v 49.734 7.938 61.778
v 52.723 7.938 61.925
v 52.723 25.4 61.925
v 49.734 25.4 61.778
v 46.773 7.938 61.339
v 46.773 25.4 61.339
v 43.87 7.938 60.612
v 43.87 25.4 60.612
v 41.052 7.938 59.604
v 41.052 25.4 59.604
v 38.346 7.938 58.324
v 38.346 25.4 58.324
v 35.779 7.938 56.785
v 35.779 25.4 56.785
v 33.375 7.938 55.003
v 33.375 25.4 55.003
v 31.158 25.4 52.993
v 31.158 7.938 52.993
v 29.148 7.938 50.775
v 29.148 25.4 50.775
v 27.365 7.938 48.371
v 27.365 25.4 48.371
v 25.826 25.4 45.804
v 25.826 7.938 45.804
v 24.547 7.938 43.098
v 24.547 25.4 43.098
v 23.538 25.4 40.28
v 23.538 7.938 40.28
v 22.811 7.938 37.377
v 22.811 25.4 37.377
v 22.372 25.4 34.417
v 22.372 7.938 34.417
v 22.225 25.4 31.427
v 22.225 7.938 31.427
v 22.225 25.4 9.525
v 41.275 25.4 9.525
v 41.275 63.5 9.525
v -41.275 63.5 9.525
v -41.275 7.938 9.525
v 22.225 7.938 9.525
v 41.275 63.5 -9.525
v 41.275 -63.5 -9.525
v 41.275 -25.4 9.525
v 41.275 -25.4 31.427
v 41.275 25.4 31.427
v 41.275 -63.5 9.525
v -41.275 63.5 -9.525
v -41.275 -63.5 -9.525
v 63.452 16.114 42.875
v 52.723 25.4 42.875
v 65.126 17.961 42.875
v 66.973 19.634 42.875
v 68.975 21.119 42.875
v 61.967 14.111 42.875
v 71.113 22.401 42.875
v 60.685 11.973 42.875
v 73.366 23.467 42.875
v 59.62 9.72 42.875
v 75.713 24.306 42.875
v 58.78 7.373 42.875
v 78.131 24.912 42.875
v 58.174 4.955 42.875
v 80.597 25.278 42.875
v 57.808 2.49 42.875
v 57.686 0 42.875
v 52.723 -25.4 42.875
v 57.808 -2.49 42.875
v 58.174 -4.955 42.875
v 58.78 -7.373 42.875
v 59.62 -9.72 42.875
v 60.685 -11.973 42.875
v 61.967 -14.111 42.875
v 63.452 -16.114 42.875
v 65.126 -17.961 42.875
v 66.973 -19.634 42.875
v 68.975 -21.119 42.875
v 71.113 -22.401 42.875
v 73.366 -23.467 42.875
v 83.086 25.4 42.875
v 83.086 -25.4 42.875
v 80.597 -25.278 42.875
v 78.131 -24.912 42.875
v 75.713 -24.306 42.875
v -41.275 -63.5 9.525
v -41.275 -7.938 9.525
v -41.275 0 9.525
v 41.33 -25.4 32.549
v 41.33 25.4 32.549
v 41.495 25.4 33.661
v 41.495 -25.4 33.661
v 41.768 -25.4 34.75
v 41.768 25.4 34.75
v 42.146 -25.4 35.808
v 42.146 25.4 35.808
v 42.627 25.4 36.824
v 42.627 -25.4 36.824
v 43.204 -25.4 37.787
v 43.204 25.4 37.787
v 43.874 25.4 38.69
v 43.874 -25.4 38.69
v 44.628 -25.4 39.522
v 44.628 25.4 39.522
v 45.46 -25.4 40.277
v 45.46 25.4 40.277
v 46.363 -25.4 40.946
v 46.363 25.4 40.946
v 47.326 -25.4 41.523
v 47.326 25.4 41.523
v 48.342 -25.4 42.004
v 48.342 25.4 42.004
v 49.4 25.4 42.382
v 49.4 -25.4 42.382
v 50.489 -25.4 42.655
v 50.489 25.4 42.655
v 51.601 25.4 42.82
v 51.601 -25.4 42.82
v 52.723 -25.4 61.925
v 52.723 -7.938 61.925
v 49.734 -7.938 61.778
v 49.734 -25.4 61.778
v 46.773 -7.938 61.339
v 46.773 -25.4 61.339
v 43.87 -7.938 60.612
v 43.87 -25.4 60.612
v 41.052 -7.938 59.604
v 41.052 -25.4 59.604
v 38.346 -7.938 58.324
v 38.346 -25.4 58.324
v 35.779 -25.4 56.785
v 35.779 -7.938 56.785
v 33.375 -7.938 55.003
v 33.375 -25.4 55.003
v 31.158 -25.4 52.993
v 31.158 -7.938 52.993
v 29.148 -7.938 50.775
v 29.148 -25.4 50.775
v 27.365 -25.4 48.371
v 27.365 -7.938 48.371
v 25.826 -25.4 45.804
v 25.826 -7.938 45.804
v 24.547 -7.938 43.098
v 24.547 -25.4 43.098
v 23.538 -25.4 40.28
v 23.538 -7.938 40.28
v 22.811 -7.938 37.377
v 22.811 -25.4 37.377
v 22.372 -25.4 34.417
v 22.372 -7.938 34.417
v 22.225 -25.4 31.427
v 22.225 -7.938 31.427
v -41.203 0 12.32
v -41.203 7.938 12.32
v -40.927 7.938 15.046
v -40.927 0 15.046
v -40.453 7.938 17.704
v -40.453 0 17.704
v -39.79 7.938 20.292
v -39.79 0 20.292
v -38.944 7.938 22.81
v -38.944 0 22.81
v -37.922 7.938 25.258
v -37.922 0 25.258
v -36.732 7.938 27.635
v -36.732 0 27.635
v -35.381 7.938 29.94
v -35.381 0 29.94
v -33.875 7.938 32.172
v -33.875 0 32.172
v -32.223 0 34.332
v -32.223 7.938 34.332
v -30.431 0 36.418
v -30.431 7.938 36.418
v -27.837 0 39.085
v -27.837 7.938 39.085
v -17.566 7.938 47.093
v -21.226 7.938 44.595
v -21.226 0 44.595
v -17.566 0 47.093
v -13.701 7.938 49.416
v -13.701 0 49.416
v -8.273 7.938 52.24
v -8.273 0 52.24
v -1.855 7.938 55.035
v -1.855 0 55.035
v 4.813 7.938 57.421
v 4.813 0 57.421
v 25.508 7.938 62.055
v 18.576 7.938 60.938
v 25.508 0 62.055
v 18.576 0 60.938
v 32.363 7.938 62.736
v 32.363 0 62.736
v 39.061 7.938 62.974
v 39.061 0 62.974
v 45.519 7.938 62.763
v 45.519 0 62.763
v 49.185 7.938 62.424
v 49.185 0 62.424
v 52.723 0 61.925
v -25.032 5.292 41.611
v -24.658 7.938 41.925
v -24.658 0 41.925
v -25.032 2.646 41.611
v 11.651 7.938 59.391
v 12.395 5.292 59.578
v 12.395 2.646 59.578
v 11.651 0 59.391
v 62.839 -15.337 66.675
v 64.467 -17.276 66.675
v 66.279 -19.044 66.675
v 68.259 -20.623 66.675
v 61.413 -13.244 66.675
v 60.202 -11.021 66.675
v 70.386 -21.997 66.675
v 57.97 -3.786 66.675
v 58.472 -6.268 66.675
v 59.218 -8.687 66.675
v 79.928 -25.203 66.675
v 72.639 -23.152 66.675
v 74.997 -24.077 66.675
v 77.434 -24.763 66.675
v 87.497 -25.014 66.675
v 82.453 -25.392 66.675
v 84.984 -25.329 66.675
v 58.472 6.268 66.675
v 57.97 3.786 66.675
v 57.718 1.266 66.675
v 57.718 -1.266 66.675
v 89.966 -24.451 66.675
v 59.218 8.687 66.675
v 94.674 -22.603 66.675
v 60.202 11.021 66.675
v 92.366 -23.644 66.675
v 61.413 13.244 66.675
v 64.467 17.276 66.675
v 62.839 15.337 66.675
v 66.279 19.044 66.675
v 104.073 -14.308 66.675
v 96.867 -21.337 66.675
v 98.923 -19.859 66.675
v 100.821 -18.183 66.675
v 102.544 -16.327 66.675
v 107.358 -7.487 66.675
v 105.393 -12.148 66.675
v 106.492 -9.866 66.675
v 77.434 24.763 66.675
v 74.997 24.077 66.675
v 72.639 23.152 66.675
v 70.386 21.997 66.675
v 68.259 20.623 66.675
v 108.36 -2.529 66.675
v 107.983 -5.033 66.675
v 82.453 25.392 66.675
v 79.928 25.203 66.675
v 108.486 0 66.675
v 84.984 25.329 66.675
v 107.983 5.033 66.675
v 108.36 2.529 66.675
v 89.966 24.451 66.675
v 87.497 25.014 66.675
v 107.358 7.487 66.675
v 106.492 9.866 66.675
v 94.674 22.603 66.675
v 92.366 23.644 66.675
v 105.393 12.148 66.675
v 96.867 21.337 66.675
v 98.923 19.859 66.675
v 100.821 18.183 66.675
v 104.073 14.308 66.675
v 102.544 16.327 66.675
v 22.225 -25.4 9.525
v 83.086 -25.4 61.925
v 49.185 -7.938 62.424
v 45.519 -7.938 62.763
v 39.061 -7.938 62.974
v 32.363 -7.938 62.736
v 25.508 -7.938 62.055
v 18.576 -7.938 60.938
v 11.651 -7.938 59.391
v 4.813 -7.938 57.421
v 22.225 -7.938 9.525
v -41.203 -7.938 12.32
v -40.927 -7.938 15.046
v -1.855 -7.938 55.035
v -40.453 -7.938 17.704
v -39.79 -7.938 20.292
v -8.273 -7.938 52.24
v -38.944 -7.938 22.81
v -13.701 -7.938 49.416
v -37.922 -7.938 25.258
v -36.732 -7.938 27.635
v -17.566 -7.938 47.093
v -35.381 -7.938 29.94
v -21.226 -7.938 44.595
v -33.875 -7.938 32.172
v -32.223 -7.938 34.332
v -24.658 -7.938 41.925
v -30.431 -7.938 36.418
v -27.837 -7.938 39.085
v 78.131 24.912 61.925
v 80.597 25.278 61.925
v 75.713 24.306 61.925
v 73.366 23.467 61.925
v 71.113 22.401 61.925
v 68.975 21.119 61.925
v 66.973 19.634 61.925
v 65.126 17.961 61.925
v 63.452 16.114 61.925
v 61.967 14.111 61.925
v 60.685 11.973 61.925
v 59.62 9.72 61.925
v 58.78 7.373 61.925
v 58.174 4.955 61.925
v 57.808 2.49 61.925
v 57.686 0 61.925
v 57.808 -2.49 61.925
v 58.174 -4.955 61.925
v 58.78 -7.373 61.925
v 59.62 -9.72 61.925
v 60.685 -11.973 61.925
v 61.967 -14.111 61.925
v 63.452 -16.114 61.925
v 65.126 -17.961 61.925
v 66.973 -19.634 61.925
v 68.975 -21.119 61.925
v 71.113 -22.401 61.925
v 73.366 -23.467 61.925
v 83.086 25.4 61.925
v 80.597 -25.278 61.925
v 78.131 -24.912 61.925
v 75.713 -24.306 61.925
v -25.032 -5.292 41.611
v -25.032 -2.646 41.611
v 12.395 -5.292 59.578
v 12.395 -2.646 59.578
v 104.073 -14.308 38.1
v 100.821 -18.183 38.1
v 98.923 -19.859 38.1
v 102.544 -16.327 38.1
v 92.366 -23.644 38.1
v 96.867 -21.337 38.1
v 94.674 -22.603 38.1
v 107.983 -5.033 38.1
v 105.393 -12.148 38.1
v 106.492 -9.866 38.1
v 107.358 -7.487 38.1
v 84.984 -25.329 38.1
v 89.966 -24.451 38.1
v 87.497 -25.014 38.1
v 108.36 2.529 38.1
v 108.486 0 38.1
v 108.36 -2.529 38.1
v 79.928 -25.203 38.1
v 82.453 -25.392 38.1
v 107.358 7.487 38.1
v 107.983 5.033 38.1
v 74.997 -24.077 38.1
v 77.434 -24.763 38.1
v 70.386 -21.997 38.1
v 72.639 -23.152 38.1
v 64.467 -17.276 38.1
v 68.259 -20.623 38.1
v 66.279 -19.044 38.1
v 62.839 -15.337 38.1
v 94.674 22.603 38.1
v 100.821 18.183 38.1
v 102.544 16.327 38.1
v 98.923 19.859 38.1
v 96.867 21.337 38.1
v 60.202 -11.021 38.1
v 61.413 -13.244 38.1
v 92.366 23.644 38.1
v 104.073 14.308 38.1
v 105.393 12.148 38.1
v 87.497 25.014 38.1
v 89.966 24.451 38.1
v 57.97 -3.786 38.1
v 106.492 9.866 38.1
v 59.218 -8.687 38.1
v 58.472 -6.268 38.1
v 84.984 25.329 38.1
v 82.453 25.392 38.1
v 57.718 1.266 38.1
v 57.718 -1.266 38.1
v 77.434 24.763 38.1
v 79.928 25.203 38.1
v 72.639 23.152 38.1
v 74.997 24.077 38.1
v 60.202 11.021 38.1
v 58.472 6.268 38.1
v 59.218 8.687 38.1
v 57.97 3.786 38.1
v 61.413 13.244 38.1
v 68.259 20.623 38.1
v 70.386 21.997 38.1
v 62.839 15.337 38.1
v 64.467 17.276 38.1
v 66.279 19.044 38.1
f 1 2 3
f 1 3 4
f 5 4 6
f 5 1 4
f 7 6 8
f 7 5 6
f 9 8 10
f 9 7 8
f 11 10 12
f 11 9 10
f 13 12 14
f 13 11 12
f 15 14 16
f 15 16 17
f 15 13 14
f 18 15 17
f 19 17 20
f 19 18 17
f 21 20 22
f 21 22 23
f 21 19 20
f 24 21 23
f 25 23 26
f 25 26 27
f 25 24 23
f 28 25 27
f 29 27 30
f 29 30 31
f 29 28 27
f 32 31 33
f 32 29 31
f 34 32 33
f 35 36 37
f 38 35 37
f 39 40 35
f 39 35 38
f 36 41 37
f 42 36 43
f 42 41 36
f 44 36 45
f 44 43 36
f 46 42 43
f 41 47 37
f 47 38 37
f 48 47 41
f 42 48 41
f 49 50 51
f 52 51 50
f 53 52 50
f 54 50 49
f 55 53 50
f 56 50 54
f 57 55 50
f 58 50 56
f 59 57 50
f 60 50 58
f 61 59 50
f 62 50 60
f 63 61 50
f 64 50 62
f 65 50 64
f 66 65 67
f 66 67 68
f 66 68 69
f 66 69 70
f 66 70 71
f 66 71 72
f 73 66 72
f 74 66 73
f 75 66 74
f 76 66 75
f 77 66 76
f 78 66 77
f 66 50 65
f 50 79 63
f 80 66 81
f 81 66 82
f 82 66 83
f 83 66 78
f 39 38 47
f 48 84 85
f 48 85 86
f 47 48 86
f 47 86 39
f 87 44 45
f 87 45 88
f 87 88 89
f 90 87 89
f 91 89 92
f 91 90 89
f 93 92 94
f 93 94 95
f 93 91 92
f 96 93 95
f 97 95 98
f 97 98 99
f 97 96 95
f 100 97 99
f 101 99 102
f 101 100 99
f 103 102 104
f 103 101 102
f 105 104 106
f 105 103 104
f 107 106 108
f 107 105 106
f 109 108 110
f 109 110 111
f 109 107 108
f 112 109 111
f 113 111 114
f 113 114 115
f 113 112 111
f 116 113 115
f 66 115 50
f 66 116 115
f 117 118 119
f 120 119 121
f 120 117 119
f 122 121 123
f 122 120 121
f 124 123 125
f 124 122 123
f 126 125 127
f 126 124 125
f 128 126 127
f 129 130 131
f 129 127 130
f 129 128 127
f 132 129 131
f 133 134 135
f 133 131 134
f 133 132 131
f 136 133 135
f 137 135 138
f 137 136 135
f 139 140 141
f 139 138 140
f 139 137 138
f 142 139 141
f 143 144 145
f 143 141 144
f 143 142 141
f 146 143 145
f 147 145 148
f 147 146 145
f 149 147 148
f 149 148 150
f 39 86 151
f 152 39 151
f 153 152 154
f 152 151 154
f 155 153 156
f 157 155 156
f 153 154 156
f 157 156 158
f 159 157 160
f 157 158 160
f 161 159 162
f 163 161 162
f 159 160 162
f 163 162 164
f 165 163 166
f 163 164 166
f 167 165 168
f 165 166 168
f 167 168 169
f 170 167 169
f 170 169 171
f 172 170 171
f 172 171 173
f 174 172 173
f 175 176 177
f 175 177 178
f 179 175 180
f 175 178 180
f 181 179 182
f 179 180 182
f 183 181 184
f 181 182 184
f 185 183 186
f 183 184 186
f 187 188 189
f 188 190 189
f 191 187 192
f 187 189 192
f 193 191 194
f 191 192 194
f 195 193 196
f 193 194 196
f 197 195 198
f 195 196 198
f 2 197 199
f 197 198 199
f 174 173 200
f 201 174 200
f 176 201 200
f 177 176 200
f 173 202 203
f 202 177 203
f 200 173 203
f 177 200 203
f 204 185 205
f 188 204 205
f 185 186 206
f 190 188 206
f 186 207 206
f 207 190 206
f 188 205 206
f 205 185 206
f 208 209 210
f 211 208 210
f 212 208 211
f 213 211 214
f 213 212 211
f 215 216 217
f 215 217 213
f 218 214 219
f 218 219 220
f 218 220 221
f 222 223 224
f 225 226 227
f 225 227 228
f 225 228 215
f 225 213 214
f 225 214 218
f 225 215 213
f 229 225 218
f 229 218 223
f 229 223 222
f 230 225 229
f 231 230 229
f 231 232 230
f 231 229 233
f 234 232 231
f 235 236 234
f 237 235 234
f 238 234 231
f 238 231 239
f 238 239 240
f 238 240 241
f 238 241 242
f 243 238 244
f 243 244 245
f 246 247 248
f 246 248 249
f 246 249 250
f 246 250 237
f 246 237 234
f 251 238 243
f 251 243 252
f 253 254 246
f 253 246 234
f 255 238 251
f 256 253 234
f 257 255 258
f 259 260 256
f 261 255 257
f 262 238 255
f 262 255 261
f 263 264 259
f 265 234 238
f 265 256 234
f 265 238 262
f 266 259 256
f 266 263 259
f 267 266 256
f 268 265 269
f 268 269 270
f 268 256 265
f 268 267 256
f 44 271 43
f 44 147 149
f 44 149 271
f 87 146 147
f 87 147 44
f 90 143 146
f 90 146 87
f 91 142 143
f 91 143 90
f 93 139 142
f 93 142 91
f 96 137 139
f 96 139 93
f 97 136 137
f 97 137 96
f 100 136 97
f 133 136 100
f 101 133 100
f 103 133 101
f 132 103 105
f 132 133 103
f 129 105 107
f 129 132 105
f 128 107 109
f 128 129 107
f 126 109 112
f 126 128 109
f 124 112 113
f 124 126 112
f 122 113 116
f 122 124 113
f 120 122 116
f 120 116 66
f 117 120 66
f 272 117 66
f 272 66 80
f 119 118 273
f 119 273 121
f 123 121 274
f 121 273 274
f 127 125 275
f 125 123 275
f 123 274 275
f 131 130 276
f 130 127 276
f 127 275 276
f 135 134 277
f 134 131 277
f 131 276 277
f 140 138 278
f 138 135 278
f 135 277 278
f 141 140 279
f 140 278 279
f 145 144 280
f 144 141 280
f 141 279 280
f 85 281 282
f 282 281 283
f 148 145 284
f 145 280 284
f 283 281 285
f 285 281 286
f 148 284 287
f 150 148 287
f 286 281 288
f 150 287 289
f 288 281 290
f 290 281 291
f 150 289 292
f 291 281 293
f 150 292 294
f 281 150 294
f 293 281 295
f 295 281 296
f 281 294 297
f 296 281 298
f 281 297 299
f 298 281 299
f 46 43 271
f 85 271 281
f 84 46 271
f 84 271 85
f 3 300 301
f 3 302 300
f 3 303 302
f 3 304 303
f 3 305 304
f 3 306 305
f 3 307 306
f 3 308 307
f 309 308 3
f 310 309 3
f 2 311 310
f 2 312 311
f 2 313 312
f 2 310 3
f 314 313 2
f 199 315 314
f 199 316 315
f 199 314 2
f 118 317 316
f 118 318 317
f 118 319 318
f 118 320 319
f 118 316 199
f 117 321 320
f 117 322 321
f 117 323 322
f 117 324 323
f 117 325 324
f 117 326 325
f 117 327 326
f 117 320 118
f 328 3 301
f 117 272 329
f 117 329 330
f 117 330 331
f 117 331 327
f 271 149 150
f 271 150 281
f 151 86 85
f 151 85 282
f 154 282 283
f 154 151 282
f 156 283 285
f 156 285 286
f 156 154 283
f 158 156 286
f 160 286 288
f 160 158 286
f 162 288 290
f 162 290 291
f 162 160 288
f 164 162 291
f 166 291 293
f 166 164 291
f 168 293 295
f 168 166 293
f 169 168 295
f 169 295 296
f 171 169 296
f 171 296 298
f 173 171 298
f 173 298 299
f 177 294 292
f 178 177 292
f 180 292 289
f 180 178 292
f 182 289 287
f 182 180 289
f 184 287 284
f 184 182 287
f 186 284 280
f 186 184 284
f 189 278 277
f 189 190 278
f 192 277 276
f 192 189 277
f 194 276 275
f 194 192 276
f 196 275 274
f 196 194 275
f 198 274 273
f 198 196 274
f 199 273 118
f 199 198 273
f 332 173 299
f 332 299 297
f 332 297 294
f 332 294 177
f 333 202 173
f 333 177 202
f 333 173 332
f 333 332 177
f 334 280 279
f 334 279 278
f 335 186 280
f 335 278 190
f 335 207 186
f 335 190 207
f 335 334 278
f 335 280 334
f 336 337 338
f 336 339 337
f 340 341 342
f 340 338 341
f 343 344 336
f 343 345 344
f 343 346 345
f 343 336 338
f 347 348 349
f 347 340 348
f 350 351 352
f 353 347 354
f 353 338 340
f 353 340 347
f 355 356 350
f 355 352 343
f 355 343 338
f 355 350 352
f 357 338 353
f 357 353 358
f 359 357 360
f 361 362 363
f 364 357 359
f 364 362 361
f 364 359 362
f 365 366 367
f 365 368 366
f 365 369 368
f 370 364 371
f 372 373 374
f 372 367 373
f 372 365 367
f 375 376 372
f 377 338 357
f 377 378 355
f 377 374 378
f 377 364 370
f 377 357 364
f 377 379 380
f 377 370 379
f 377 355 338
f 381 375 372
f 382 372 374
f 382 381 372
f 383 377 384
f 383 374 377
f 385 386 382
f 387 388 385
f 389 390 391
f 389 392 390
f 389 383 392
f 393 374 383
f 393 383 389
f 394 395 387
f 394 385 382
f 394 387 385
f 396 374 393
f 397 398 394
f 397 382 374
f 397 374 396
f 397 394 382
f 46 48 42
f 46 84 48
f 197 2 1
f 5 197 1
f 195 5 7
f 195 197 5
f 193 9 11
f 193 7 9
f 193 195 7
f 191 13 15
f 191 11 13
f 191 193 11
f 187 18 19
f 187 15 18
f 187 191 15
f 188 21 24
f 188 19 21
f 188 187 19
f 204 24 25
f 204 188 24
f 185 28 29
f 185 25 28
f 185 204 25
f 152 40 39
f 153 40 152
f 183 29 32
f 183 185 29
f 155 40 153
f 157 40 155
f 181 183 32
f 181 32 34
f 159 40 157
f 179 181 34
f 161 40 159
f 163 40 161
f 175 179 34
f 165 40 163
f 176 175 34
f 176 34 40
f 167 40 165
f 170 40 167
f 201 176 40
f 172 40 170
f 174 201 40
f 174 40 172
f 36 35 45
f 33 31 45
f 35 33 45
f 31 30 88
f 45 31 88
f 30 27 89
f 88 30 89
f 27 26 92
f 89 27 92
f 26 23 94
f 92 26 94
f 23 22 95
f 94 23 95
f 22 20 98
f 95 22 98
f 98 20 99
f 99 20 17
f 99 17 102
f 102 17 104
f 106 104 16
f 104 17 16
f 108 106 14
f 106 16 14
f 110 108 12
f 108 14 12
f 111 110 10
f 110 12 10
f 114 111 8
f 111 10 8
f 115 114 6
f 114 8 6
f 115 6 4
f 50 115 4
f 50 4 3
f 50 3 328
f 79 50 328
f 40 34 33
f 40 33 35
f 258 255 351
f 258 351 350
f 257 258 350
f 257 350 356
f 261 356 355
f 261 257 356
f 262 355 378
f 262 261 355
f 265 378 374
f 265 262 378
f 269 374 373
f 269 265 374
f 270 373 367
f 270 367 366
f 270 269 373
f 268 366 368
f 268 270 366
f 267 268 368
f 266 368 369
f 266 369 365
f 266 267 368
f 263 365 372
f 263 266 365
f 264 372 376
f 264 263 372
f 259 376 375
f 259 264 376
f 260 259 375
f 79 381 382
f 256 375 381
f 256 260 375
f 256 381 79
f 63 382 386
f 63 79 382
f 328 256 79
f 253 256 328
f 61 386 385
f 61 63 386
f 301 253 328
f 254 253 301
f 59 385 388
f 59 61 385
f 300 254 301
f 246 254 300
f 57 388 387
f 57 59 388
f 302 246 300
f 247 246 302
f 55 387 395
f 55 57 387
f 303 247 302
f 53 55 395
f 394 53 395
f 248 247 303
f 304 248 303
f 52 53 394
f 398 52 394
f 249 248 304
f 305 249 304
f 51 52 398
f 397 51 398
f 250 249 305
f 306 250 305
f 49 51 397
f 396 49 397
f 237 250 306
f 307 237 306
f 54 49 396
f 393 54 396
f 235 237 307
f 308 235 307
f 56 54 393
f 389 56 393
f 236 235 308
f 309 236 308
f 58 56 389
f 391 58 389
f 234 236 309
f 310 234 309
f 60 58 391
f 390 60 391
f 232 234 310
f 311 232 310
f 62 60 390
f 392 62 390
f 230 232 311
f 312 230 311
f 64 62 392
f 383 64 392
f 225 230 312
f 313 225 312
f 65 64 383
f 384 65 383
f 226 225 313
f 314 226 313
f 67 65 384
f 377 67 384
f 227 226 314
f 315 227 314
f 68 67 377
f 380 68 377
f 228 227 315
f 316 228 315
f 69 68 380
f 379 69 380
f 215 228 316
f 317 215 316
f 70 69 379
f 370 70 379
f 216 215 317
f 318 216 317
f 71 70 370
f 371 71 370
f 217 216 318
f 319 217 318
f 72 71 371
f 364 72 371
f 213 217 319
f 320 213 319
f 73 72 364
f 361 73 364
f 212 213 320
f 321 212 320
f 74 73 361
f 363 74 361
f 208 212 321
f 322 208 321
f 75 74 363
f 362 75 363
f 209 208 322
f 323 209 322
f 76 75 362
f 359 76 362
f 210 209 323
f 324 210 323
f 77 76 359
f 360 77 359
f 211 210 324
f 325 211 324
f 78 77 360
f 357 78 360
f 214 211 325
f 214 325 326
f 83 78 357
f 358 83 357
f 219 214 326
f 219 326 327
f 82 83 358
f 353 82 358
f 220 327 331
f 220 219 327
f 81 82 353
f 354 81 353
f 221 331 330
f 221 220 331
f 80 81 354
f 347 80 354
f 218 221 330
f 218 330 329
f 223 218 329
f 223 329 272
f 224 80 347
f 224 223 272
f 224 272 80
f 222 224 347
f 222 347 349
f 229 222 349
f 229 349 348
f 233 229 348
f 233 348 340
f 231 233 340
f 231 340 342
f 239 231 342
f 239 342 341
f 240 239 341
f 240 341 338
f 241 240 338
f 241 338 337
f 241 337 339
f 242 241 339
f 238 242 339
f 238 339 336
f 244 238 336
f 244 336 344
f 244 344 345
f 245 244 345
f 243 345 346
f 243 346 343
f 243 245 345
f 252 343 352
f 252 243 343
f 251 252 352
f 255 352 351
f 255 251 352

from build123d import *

# Parameters (mm, degrees)
F1_DEPTH = 63.5
F0_W     = 25.4
F0_H     = 19.05
F2_DEPTH = 25.4
F3_DEPTH = 7.9375


with BuildPart() as f1:
    # F0 (on Front) → F1 (new body, symmetric)
    with BuildSketch(Plane.XZ):
        Polygon((-41.275, -9.525), (41.275, -9.525), (41.275, 9.525), (22.225, 9.525), (-41.275, 9.525), align=None)
    extrude(amount=F1_DEPTH, both=True)

    # F0 (on Front) → F2 (join, symmetric)
    with BuildSketch(Plane.XZ):
        with BuildLine():
            Line((22.225, 9.525), (41.275, 9.525))
            Line((41.275, 9.525), (41.275, 31.427365057))
            ThreePointArc((41.275, 31.427365057), (44.6279932249, 39.5222067751), (52.722834943, 42.8752))
            Line((52.722834943, 42.8752), (57.6861744831, 42.8752))
            Line((57.6861744831, 42.8752), (57.6861744831, 61.9252))
            Line((57.6861744831, 61.9252), (52.722834943, 61.9252))
            ThreePointArc((52.722834943, 61.9252), (31.1576090433, 52.9925909567), (22.225, 31.427365057))
            Line((22.225, 31.427365057), (22.225, 9.525))
        make_face()
        with Locations((70.3861744831, 52.4002)):
            Rectangle(F0_W, F0_H)
    extrude(amount=F2_DEPTH, both=True)

    # F0 (on Front) → F3 (join, symmetric)
    with BuildSketch(Plane.XZ):
        with BuildLine():
            add(Edge.make_bspline(
                [(-41.275, 9.525), (-41.7181551456, 48.1705069542), (17.0384701341, 67.8877606988), (52.722834943, 61.9252)],
                knots=[0, 0, 0, 0, 107.6167920634, 107.6167920634, 107.6167920634, 107.6167920634], degree=3))
            Line((-41.275, 9.525), (22.225, 9.525))
            Line((22.225, 9.525), (22.225, 31.427365057))
            ThreePointArc((22.225, 31.427365057), (31.1576090433, 52.9925909567), (52.722834943, 61.9252))
        make_face()
    extrude(amount=F3_DEPTH, both=True)

    # F0 (on Front) → F4 (revolve)
    with BuildSketch(Plane.XZ):
        Polygon((83.0861744831, 66.675), (83.0861744831, 61.9252), (83.0861744831, 42.8752), (83.0861744831, 38.1), (108.4861744831, 38.1), (108.4861744831, 66.675), align=None)
    revolve(axis=Axis((83.0861744831, 0, 50.0126), (0, 0, 1)))


solid = f1.part
